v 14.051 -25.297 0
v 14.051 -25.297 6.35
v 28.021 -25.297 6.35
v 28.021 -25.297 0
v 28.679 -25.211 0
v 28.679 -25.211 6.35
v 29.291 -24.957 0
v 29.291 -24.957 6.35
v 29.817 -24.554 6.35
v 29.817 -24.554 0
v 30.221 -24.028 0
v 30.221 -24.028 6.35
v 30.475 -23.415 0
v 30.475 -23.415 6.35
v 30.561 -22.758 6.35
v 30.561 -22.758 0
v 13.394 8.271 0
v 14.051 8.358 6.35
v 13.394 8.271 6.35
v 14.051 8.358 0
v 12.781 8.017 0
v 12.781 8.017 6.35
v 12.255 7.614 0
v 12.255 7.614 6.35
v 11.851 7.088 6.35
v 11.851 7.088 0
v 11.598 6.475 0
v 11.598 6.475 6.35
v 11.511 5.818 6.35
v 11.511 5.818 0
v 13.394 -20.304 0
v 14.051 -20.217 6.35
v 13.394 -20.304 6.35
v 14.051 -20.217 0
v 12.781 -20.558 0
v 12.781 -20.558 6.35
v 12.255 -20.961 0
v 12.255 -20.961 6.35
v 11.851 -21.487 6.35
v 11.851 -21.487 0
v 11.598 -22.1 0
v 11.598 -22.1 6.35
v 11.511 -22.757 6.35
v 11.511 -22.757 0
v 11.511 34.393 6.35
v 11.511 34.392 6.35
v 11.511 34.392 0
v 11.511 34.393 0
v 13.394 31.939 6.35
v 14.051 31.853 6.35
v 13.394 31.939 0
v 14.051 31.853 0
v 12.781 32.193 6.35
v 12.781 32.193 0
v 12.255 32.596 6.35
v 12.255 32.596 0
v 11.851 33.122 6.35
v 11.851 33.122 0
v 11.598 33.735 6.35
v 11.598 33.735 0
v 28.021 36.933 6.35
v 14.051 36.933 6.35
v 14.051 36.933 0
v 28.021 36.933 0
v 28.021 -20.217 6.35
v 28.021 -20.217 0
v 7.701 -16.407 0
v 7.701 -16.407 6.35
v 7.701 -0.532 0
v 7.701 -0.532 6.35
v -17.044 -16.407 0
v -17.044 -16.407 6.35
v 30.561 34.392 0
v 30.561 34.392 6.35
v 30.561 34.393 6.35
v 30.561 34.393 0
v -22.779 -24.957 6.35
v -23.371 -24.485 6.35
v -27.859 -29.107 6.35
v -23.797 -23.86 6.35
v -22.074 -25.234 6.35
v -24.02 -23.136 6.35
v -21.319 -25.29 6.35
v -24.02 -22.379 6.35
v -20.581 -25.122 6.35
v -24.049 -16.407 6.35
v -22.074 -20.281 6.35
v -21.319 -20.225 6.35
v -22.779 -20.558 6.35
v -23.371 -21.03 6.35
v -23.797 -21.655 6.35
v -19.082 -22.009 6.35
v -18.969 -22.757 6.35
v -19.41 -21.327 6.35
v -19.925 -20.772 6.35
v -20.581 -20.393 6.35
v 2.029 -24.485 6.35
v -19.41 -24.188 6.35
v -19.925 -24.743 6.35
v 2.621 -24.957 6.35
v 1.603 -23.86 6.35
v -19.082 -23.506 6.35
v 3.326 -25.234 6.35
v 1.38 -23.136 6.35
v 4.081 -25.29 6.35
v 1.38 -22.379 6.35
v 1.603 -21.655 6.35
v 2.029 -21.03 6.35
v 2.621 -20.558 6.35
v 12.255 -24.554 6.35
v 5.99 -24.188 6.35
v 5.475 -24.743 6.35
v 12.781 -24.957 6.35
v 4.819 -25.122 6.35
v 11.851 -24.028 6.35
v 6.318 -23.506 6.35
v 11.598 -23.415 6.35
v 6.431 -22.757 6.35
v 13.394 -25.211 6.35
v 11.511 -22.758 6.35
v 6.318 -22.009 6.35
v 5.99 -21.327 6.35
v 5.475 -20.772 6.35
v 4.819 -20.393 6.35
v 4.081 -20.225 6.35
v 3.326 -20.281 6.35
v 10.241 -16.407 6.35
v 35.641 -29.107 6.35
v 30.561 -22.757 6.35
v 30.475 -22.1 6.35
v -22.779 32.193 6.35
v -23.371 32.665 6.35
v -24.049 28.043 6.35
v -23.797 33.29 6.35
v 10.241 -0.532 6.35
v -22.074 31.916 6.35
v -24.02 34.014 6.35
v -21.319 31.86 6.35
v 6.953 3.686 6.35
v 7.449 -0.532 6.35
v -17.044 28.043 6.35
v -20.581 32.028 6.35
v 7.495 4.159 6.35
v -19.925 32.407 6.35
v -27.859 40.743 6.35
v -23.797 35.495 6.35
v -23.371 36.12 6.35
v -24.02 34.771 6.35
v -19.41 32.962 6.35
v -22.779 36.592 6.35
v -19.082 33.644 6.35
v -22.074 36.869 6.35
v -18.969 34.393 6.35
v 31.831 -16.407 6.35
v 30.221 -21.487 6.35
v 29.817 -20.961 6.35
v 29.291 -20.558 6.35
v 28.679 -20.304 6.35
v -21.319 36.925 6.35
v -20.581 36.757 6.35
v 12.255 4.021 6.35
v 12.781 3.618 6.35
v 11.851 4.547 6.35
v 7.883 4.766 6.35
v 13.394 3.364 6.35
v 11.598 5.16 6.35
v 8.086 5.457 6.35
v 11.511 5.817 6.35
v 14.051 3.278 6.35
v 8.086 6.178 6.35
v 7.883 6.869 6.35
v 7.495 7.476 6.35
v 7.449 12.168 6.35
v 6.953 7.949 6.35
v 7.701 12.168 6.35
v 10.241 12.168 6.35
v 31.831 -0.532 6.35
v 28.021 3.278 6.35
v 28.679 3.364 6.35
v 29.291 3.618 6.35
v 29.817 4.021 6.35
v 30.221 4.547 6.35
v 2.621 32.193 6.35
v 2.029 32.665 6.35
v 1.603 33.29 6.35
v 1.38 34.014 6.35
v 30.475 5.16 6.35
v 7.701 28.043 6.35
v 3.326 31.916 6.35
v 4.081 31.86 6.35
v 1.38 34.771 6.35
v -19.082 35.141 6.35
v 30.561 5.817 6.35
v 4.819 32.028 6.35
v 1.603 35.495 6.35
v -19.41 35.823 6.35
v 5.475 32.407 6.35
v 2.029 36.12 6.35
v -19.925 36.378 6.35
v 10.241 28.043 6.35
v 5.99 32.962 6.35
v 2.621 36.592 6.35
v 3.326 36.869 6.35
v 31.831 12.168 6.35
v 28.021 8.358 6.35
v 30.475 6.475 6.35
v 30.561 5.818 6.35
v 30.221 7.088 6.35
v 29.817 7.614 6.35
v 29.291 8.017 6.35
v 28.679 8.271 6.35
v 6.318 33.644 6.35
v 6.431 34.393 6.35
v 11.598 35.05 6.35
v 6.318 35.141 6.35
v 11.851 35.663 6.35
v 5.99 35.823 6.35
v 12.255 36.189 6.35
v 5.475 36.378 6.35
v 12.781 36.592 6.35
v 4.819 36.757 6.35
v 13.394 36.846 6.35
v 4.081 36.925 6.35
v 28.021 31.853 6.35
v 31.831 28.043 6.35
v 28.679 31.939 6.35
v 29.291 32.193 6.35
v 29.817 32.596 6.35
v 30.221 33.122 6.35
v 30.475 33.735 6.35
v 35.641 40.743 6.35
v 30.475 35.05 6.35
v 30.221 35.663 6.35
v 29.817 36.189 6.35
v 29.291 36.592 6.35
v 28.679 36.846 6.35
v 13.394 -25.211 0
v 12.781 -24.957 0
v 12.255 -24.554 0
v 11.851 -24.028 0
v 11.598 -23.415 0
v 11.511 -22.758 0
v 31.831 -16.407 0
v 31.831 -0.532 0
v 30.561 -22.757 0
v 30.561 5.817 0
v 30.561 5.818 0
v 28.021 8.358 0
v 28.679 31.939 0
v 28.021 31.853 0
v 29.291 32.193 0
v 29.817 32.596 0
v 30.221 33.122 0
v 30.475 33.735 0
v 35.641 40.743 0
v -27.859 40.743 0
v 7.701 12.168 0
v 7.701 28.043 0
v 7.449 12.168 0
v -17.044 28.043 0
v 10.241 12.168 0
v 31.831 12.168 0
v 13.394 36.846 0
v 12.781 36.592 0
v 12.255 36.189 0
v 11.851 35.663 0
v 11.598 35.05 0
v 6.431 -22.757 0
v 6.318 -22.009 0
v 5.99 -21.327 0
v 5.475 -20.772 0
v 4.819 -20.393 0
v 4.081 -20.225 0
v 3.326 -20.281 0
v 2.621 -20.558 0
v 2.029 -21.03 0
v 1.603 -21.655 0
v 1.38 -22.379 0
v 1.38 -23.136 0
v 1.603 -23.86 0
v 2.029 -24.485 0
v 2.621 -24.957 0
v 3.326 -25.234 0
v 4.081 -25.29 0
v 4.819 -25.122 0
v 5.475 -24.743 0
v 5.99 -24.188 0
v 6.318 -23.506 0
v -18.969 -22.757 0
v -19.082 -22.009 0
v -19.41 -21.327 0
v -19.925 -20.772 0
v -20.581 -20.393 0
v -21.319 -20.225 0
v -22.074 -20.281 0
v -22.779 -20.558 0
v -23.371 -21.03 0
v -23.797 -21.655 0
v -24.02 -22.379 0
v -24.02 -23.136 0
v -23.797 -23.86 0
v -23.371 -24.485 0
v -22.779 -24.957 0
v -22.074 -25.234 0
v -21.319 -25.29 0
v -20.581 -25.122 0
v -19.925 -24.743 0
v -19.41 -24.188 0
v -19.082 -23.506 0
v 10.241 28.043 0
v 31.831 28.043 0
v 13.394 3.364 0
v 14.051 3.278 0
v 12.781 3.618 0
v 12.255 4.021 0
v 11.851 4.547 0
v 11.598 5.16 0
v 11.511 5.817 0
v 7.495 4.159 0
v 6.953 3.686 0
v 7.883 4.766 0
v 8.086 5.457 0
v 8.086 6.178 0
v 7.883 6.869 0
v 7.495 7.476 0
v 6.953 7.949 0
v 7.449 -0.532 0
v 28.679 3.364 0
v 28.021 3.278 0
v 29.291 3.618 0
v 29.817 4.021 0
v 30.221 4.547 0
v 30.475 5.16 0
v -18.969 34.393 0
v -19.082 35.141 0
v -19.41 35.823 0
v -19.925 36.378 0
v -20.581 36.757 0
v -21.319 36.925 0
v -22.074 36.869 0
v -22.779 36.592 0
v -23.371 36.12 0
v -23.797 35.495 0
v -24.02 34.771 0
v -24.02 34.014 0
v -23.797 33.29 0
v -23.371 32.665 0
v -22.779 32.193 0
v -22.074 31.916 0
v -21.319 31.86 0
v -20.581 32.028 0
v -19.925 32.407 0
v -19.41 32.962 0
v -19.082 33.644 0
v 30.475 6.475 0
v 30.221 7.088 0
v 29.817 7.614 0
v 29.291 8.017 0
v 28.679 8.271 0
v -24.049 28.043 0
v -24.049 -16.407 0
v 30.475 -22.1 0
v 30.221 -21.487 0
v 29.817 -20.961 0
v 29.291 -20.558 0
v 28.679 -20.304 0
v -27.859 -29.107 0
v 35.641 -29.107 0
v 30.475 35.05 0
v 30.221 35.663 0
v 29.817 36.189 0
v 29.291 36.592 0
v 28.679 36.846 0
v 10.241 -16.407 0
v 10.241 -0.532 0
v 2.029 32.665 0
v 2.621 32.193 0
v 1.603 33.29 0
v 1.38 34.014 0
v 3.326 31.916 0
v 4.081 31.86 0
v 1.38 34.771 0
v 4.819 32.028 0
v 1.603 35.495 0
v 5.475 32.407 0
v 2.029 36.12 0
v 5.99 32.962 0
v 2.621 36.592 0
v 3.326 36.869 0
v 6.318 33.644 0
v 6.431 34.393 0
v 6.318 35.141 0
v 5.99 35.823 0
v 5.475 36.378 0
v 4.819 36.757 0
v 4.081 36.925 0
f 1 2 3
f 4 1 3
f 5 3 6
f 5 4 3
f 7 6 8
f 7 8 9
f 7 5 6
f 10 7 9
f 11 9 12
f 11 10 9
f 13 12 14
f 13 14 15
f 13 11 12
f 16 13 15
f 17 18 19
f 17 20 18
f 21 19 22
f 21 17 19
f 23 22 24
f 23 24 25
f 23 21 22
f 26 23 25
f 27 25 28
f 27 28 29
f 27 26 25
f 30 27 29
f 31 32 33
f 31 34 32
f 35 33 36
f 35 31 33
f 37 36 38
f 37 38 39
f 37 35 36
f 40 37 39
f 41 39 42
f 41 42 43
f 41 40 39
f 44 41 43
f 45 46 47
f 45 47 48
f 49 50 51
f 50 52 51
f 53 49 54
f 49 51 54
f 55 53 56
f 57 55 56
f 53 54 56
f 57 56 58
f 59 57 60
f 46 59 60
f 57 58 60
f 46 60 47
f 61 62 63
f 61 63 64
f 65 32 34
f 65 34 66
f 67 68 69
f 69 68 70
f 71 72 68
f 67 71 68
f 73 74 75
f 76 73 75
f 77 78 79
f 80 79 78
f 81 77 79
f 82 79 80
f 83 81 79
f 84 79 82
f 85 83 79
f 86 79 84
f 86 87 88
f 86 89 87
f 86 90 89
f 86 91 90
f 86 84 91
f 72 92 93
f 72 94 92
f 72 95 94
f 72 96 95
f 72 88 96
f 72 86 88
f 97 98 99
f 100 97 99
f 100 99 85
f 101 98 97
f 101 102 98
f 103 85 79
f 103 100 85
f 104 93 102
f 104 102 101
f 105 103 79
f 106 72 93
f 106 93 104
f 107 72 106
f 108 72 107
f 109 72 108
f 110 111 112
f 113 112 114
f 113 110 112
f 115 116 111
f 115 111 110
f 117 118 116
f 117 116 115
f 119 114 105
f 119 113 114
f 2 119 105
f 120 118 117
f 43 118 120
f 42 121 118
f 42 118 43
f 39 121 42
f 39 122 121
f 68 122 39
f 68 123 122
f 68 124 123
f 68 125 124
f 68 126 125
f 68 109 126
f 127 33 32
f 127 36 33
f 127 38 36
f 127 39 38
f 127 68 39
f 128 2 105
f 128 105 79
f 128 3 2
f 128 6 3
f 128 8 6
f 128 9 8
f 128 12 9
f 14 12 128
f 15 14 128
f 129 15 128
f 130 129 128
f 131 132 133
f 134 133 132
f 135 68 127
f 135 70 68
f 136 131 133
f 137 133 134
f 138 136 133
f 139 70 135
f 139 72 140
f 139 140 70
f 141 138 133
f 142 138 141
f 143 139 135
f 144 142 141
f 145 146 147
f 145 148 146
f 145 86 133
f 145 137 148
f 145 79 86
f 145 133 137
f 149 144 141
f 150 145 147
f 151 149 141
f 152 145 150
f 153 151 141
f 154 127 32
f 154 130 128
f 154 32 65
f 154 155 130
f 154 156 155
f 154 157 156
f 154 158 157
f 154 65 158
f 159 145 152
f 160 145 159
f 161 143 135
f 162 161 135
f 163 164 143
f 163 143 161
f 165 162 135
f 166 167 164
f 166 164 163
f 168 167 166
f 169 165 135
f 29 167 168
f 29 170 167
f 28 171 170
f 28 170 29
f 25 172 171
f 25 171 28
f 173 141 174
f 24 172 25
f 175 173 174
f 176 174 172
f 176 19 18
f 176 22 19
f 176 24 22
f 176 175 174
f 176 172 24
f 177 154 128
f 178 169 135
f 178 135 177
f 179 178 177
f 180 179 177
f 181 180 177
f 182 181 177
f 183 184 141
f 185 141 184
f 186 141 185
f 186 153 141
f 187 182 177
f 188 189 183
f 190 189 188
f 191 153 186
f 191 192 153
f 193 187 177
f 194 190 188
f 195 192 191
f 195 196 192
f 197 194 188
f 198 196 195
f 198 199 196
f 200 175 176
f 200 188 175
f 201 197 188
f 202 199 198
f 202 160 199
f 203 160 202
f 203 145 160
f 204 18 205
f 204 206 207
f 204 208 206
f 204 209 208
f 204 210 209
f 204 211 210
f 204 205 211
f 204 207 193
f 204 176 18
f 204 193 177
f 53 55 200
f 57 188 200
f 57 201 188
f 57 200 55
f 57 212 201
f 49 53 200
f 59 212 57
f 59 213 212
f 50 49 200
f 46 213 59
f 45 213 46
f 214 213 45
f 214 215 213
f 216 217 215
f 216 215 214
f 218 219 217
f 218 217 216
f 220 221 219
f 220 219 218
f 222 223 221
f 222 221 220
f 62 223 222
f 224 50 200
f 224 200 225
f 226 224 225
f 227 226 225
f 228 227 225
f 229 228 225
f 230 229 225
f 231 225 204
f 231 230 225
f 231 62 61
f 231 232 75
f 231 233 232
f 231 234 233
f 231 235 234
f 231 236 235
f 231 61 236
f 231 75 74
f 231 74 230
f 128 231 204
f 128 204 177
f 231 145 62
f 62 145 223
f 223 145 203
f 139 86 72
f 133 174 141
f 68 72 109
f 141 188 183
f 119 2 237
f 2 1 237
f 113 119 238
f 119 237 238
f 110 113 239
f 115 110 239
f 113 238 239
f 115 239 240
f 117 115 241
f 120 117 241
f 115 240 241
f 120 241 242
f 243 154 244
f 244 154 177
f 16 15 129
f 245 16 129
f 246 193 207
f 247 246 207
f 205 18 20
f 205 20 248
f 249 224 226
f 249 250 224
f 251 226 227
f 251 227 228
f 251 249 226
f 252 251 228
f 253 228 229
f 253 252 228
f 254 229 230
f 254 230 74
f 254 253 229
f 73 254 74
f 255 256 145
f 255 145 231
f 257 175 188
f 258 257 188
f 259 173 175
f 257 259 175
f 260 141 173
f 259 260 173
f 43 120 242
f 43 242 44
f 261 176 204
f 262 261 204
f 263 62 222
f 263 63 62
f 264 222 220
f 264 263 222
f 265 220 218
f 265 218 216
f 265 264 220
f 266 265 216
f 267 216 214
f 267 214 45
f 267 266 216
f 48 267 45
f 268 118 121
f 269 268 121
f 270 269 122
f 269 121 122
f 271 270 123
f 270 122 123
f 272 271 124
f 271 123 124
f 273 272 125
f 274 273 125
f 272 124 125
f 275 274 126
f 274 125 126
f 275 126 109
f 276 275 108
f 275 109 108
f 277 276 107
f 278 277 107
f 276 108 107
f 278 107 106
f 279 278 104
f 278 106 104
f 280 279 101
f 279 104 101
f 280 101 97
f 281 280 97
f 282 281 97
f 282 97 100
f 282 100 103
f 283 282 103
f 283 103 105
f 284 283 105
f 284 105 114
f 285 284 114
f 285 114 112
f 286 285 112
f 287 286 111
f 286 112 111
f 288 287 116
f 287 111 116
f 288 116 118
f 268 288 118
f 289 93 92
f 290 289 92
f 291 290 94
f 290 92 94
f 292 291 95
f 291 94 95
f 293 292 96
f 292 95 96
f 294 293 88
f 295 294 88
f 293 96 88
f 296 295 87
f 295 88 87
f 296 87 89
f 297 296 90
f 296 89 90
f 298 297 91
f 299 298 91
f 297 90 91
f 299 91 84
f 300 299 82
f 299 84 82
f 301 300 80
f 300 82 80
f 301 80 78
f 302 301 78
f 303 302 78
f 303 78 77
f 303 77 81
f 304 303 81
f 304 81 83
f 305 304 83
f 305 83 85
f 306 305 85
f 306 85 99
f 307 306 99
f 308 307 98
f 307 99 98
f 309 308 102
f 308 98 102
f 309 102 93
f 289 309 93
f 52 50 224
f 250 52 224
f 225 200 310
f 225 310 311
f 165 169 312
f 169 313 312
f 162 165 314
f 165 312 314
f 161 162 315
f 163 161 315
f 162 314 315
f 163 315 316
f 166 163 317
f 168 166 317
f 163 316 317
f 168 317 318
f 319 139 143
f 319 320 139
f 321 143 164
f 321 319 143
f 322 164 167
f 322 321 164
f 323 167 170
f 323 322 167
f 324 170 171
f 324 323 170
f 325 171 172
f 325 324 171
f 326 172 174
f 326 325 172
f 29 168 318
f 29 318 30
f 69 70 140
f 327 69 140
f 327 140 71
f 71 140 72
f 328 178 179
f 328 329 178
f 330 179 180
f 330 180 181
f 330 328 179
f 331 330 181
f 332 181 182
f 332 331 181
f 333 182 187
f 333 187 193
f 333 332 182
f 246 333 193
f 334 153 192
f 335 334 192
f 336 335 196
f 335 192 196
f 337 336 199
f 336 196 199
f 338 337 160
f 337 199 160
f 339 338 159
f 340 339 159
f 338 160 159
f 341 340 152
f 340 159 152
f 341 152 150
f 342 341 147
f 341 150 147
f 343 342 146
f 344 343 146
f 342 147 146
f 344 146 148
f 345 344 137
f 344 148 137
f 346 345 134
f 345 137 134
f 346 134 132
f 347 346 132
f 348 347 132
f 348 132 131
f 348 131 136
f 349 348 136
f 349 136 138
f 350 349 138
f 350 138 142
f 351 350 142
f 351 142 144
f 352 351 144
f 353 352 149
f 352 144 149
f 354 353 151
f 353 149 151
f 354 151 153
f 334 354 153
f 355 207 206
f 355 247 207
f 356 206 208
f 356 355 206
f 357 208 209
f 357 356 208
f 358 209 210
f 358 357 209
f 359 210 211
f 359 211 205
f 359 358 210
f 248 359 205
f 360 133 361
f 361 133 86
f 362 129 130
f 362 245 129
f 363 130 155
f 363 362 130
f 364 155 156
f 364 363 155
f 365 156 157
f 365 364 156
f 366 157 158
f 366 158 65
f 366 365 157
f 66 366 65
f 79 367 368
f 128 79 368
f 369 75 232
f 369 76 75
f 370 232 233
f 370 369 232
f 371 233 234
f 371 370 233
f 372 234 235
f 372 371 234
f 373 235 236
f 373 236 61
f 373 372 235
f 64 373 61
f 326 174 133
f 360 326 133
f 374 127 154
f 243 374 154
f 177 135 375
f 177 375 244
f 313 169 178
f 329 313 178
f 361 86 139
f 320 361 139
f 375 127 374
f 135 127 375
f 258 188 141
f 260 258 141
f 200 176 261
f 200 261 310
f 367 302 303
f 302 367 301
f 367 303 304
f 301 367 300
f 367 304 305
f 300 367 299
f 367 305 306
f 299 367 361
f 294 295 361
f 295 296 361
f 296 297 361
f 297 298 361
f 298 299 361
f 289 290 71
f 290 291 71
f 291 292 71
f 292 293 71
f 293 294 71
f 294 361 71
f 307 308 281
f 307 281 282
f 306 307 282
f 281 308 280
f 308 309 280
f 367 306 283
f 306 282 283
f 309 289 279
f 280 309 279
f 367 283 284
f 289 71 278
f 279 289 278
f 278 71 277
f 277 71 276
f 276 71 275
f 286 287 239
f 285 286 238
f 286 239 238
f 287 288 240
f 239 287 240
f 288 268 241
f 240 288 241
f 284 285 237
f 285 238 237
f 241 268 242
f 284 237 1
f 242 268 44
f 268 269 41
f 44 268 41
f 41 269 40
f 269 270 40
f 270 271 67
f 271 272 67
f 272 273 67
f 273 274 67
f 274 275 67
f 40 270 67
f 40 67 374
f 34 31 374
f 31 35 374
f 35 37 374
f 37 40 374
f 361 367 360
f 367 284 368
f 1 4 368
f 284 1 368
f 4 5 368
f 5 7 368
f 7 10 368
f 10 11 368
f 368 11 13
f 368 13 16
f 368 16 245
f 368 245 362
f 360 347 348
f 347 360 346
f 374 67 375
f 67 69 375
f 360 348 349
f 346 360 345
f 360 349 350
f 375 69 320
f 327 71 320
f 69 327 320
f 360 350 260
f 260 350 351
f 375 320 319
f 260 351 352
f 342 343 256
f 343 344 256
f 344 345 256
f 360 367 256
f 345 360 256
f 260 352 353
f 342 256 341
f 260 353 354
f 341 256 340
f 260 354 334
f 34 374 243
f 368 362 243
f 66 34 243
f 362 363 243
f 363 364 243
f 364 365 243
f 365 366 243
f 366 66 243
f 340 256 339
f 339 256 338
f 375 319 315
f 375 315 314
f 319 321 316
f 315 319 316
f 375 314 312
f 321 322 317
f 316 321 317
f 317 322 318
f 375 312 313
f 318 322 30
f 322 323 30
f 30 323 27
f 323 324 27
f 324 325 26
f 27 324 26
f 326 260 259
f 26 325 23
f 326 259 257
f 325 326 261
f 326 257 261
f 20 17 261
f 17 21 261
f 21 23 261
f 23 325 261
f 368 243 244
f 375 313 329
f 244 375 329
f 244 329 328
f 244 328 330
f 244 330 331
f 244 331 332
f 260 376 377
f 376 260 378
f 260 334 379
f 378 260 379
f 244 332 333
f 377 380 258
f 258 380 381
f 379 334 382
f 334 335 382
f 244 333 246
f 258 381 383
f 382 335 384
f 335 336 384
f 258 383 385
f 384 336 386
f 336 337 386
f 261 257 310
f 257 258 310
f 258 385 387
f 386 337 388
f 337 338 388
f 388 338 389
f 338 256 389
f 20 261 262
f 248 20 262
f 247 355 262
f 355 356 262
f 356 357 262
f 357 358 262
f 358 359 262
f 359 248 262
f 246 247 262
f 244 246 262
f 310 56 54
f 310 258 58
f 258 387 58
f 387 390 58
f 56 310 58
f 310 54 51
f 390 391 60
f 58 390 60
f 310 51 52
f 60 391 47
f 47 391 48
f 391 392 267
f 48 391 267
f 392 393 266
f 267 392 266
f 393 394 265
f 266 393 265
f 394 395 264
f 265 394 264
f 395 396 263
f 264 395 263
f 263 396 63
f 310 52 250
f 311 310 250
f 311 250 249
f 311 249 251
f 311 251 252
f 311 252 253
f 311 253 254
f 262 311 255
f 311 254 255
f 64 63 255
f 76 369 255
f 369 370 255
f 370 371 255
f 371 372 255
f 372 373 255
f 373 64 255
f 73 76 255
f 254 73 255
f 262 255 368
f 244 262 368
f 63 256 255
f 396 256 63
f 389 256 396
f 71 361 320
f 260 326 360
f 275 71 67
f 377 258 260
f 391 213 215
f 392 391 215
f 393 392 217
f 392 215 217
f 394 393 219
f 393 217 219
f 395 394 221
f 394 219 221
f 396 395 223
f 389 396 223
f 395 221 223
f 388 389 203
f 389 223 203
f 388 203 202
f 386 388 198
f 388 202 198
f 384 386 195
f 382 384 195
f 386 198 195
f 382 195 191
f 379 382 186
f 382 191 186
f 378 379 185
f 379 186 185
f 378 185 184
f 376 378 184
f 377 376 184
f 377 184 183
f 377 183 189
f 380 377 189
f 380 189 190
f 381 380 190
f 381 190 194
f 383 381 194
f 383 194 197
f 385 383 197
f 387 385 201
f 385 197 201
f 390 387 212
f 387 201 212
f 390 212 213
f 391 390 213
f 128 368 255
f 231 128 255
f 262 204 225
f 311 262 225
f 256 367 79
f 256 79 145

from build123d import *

# Parameters (mm, degrees)
SKETCH1_W           = 63.5
SKETCH1_H           = 69.85
BOSS_EXTRUDE1_DEPTH = 6.35
SKETCH2_R           = 2.54
SKETCH2_W           = 19.05
SKETCH2_H           = 5.08
CUT_EXTRUDE1_DEPTH  = 6.35
FILLET1_R           = 2.54
SKETCH3_W           = 21.59
SKETCH3_H           = 15.875
CUT_EXTRUDE2_DEPTH  = 7.62
FILLET3_R           = 2.54


with BuildPart() as part:
    # Sketch1 → Boss-Extrude1 (new body)
    with BuildSketch(Plane.XY):
        with Locations((3.891179619, 5.817505184)):
            Rectangle(SKETCH1_W, SKETCH1_H)
    extrude(amount=BOSS_EXTRUDE1_DEPTH)

    # Sketch2 → Cut-Extrude1 (cut)
    with BuildSketch(Plane.XY.offset(6.35)):
        with Locations((-21.508820381, 34.392505184)):
            Circle(SKETCH2_R)
        with Locations((3.891179619, 34.392505184)):
            Circle(SKETCH2_R)
        with Locations((-21.508820381, -22.757494816)):
            Circle(SKETCH2_R)
        with Locations((3.891179619, -22.757494816)):
            Circle(SKETCH2_R)
        with Locations((21.036179619, 34.392505184)):
            Rectangle(SKETCH2_W, SKETCH2_H)
        with Locations((21.036179619, -22.757494816)):
            Rectangle(SKETCH2_W, SKETCH2_H)
        with Locations((21.036179619, 5.817505184)):
            Rectangle(SKETCH2_W, SKETCH2_H)
    extrude(amount=-CUT_EXTRUDE1_DEPTH, mode=Mode.SUBTRACT)

    # Fillet1
    fillet1_edges = [part.edges().sort_by_distance(p)[0] for p in [
        (30.561179619, 31.852505184, 3.175),
        (30.561179619, 3.277505184, 3.175),
        (30.561179619, -25.297494816, 3.175),
        (30.561179619, -20.217494816, 3.175),
        (30.561179619, 8.357505184, 3.175),
        (30.561179619, 36.932505184, 3.175),
        (11.511179619, -20.217494816, 3.175),
        (11.511179619, 8.357505184, 3.175),
        (11.511179619, 36.932505184, 3.175),
        (11.511179619, 31.852505184, 3.175),
        (11.511179619, 3.277505184, 3.175),
        (11.511179619, -25.297494816, 3.175),
    ]]
    fillet(fillet1_edges, radius=FILLET1_R - 0.0001)  # a hair under: the kernel refuses the full size

    # Sketch3 → Cut-Extrude2 (cut)
    with BuildSketch(Plane.XY.offset(6.35)):
        Polygon((-17.043797687, -16.407494816), (7.701179619, -16.407494816), (7.701179619, -0.532494816), (7.449059455, -0.532494816), align=None)
        with Locations((21.036179619, -8.469994816)):
            Rectangle(SKETCH3_W, SKETCH3_H)
        Polygon((-24.048820381, -16.407494816), (10.241179619, 5.817505184), (-24.048820381, 28.042505184), align=None)
        Polygon((-17.043797687, 28.042505184), (7.449059455, 12.167505184), (7.701179619, 12.167505184), (7.701179619, 28.042505184), align=None)
        with Locations((21.036179619, 20.105005184)):
            Rectangle(SKETCH3_W, SKETCH3_H)
    extrude(amount=-CUT_EXTRUDE2_DEPTH, mode=Mode.SUBTRACT)

    # Fillet3
    fillet3_edges = [part.edges().sort_by_distance(p)[0] for p in [
        (10.241179619, 5.817505184, 3.175),
    ]]
    fillet(fillet3_edges, radius=FILLET3_R)


solid = part.part
